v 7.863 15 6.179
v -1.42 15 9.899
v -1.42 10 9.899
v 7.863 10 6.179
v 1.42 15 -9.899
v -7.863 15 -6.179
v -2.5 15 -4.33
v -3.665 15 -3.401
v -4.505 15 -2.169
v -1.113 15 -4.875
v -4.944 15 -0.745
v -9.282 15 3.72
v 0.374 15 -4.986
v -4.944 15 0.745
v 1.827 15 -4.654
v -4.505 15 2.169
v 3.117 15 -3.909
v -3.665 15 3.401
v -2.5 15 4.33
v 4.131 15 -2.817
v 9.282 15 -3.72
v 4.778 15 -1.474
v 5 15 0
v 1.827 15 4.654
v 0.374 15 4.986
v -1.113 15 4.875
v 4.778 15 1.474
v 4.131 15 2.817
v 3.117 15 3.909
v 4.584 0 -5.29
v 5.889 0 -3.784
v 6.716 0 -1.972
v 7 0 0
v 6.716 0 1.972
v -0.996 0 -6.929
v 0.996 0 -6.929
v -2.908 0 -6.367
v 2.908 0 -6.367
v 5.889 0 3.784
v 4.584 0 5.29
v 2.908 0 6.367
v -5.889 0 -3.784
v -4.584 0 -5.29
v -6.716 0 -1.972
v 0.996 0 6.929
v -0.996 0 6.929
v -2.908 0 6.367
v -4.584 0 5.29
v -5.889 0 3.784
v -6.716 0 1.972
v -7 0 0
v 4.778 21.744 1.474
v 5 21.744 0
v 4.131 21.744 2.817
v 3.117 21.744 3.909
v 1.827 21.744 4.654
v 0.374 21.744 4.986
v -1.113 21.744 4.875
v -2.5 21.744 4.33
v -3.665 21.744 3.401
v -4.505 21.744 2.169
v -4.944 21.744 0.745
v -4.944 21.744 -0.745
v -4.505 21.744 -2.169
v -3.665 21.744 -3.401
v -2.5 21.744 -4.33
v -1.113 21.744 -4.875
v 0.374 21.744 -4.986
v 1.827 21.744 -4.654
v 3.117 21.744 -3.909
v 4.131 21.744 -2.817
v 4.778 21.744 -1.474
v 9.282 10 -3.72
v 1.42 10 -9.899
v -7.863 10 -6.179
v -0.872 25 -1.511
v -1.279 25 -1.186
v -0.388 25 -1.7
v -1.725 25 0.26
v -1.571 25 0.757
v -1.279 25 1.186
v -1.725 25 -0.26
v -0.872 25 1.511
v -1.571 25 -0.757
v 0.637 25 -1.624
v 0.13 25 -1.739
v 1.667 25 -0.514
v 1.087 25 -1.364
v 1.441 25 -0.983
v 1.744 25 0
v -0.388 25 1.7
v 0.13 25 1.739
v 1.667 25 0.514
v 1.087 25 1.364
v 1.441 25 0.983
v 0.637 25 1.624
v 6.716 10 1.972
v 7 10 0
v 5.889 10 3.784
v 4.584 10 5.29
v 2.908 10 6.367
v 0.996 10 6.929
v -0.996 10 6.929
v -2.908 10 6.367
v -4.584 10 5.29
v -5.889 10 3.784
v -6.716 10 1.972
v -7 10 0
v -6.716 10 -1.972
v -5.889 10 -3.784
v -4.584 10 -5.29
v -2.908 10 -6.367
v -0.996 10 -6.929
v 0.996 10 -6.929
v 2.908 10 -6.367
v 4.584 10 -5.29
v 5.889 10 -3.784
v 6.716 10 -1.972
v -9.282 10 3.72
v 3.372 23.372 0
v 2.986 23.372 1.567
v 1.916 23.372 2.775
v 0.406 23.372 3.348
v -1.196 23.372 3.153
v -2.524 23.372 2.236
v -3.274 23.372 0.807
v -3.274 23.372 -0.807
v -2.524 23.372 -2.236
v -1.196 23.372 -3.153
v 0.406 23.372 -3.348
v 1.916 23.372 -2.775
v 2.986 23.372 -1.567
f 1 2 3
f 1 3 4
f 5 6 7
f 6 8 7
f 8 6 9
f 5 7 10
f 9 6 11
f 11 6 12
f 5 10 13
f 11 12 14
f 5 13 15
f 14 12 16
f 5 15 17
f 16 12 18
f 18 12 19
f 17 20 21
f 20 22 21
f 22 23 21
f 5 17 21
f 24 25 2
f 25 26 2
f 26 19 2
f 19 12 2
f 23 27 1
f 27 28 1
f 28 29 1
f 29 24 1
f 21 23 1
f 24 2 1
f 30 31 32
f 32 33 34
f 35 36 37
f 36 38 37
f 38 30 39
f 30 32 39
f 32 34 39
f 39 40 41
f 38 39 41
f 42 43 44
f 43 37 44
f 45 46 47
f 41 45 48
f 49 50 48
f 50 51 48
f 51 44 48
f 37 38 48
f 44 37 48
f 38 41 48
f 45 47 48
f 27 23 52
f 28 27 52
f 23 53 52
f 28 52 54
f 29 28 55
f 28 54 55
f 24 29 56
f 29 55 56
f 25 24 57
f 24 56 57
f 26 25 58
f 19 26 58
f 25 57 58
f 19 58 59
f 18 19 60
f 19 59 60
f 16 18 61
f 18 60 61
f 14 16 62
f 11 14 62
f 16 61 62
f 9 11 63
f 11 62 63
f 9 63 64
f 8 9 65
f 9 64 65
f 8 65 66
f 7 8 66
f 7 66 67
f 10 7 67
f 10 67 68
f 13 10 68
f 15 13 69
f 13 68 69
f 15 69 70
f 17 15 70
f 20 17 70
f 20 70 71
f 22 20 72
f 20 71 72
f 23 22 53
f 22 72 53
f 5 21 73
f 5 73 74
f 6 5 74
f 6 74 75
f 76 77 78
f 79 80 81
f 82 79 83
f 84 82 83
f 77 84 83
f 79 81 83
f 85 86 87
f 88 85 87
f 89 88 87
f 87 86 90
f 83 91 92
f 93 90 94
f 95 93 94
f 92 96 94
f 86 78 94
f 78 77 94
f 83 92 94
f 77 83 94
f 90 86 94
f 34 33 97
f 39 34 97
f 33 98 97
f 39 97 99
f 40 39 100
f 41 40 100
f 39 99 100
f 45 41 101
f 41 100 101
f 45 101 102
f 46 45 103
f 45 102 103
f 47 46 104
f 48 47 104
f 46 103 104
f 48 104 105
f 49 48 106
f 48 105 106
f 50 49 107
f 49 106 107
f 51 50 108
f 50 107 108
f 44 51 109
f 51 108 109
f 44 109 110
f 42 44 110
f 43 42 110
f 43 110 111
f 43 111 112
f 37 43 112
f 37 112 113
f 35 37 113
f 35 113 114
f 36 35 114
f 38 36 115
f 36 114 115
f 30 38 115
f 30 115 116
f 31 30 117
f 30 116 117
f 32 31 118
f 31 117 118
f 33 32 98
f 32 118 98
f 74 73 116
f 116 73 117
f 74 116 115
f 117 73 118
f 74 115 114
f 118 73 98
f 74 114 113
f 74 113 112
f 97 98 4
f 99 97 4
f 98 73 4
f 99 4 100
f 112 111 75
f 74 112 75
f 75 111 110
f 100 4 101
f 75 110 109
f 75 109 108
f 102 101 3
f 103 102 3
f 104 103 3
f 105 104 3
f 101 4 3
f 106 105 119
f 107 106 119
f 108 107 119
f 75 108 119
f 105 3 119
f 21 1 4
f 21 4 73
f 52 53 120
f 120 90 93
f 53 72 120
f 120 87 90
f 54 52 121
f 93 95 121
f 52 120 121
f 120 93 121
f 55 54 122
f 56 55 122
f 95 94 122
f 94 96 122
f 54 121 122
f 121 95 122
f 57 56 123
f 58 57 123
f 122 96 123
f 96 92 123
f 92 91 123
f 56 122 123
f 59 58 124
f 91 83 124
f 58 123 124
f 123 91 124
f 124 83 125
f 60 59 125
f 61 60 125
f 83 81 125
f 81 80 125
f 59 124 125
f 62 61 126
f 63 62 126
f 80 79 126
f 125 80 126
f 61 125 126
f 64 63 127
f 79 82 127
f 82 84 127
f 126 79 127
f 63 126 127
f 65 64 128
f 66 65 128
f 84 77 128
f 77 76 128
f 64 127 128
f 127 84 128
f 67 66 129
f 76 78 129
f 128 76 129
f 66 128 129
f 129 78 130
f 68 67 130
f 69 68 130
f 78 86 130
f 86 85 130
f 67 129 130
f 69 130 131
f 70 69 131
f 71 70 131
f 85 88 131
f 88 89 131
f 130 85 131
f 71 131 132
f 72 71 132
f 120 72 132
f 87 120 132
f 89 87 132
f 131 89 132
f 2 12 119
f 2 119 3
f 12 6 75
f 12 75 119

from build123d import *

# Parameters (mm, degrees)
SKETCH_2_OUTSIDE_W  = 29.55
SKETCH_2_OUTSIDE_H  = 29.55
CUT_EXTRUDE_1_DEPTH = 16


with BuildPart() as part:
    # Эскиз1 → Повернуть1 (revolve)
    with BuildSketch(Plane.XY):
        Polygon((0, 0), (7, 0), (7, 10), (10, 10), (10, 15), (5, 15), (5, 21.744186047), (1.744186047, 25), (0, 25), align=None)
    revolve(axis=Axis((0, 25, 0), (0, -1, 0)))

    # Эскиз2 outside → Вырез-Вытянуть1 (cut, through all)
    with BuildSketch(Plane(origin=(0, 15, 0), x_dir=(1, 0, 0), z_dir=(0, 1, 0))):
        Rectangle(SKETCH_2_OUTSIDE_W, SKETCH_2_OUTSIDE_H)
        Polygon((7.862707781, -6.178820789), (9.282369659, 3.719894287), (1.419661878, 9.898715076), (-7.862707781, 6.178820789), (-9.282369659, -3.719894287), (-1.419661878, -9.898715076), align=None, mode=Mode.SUBTRACT)
    extrude(amount=-CUT_EXTRUDE_1_DEPTH, mode=Mode.SUBTRACT)


solid = part.part
